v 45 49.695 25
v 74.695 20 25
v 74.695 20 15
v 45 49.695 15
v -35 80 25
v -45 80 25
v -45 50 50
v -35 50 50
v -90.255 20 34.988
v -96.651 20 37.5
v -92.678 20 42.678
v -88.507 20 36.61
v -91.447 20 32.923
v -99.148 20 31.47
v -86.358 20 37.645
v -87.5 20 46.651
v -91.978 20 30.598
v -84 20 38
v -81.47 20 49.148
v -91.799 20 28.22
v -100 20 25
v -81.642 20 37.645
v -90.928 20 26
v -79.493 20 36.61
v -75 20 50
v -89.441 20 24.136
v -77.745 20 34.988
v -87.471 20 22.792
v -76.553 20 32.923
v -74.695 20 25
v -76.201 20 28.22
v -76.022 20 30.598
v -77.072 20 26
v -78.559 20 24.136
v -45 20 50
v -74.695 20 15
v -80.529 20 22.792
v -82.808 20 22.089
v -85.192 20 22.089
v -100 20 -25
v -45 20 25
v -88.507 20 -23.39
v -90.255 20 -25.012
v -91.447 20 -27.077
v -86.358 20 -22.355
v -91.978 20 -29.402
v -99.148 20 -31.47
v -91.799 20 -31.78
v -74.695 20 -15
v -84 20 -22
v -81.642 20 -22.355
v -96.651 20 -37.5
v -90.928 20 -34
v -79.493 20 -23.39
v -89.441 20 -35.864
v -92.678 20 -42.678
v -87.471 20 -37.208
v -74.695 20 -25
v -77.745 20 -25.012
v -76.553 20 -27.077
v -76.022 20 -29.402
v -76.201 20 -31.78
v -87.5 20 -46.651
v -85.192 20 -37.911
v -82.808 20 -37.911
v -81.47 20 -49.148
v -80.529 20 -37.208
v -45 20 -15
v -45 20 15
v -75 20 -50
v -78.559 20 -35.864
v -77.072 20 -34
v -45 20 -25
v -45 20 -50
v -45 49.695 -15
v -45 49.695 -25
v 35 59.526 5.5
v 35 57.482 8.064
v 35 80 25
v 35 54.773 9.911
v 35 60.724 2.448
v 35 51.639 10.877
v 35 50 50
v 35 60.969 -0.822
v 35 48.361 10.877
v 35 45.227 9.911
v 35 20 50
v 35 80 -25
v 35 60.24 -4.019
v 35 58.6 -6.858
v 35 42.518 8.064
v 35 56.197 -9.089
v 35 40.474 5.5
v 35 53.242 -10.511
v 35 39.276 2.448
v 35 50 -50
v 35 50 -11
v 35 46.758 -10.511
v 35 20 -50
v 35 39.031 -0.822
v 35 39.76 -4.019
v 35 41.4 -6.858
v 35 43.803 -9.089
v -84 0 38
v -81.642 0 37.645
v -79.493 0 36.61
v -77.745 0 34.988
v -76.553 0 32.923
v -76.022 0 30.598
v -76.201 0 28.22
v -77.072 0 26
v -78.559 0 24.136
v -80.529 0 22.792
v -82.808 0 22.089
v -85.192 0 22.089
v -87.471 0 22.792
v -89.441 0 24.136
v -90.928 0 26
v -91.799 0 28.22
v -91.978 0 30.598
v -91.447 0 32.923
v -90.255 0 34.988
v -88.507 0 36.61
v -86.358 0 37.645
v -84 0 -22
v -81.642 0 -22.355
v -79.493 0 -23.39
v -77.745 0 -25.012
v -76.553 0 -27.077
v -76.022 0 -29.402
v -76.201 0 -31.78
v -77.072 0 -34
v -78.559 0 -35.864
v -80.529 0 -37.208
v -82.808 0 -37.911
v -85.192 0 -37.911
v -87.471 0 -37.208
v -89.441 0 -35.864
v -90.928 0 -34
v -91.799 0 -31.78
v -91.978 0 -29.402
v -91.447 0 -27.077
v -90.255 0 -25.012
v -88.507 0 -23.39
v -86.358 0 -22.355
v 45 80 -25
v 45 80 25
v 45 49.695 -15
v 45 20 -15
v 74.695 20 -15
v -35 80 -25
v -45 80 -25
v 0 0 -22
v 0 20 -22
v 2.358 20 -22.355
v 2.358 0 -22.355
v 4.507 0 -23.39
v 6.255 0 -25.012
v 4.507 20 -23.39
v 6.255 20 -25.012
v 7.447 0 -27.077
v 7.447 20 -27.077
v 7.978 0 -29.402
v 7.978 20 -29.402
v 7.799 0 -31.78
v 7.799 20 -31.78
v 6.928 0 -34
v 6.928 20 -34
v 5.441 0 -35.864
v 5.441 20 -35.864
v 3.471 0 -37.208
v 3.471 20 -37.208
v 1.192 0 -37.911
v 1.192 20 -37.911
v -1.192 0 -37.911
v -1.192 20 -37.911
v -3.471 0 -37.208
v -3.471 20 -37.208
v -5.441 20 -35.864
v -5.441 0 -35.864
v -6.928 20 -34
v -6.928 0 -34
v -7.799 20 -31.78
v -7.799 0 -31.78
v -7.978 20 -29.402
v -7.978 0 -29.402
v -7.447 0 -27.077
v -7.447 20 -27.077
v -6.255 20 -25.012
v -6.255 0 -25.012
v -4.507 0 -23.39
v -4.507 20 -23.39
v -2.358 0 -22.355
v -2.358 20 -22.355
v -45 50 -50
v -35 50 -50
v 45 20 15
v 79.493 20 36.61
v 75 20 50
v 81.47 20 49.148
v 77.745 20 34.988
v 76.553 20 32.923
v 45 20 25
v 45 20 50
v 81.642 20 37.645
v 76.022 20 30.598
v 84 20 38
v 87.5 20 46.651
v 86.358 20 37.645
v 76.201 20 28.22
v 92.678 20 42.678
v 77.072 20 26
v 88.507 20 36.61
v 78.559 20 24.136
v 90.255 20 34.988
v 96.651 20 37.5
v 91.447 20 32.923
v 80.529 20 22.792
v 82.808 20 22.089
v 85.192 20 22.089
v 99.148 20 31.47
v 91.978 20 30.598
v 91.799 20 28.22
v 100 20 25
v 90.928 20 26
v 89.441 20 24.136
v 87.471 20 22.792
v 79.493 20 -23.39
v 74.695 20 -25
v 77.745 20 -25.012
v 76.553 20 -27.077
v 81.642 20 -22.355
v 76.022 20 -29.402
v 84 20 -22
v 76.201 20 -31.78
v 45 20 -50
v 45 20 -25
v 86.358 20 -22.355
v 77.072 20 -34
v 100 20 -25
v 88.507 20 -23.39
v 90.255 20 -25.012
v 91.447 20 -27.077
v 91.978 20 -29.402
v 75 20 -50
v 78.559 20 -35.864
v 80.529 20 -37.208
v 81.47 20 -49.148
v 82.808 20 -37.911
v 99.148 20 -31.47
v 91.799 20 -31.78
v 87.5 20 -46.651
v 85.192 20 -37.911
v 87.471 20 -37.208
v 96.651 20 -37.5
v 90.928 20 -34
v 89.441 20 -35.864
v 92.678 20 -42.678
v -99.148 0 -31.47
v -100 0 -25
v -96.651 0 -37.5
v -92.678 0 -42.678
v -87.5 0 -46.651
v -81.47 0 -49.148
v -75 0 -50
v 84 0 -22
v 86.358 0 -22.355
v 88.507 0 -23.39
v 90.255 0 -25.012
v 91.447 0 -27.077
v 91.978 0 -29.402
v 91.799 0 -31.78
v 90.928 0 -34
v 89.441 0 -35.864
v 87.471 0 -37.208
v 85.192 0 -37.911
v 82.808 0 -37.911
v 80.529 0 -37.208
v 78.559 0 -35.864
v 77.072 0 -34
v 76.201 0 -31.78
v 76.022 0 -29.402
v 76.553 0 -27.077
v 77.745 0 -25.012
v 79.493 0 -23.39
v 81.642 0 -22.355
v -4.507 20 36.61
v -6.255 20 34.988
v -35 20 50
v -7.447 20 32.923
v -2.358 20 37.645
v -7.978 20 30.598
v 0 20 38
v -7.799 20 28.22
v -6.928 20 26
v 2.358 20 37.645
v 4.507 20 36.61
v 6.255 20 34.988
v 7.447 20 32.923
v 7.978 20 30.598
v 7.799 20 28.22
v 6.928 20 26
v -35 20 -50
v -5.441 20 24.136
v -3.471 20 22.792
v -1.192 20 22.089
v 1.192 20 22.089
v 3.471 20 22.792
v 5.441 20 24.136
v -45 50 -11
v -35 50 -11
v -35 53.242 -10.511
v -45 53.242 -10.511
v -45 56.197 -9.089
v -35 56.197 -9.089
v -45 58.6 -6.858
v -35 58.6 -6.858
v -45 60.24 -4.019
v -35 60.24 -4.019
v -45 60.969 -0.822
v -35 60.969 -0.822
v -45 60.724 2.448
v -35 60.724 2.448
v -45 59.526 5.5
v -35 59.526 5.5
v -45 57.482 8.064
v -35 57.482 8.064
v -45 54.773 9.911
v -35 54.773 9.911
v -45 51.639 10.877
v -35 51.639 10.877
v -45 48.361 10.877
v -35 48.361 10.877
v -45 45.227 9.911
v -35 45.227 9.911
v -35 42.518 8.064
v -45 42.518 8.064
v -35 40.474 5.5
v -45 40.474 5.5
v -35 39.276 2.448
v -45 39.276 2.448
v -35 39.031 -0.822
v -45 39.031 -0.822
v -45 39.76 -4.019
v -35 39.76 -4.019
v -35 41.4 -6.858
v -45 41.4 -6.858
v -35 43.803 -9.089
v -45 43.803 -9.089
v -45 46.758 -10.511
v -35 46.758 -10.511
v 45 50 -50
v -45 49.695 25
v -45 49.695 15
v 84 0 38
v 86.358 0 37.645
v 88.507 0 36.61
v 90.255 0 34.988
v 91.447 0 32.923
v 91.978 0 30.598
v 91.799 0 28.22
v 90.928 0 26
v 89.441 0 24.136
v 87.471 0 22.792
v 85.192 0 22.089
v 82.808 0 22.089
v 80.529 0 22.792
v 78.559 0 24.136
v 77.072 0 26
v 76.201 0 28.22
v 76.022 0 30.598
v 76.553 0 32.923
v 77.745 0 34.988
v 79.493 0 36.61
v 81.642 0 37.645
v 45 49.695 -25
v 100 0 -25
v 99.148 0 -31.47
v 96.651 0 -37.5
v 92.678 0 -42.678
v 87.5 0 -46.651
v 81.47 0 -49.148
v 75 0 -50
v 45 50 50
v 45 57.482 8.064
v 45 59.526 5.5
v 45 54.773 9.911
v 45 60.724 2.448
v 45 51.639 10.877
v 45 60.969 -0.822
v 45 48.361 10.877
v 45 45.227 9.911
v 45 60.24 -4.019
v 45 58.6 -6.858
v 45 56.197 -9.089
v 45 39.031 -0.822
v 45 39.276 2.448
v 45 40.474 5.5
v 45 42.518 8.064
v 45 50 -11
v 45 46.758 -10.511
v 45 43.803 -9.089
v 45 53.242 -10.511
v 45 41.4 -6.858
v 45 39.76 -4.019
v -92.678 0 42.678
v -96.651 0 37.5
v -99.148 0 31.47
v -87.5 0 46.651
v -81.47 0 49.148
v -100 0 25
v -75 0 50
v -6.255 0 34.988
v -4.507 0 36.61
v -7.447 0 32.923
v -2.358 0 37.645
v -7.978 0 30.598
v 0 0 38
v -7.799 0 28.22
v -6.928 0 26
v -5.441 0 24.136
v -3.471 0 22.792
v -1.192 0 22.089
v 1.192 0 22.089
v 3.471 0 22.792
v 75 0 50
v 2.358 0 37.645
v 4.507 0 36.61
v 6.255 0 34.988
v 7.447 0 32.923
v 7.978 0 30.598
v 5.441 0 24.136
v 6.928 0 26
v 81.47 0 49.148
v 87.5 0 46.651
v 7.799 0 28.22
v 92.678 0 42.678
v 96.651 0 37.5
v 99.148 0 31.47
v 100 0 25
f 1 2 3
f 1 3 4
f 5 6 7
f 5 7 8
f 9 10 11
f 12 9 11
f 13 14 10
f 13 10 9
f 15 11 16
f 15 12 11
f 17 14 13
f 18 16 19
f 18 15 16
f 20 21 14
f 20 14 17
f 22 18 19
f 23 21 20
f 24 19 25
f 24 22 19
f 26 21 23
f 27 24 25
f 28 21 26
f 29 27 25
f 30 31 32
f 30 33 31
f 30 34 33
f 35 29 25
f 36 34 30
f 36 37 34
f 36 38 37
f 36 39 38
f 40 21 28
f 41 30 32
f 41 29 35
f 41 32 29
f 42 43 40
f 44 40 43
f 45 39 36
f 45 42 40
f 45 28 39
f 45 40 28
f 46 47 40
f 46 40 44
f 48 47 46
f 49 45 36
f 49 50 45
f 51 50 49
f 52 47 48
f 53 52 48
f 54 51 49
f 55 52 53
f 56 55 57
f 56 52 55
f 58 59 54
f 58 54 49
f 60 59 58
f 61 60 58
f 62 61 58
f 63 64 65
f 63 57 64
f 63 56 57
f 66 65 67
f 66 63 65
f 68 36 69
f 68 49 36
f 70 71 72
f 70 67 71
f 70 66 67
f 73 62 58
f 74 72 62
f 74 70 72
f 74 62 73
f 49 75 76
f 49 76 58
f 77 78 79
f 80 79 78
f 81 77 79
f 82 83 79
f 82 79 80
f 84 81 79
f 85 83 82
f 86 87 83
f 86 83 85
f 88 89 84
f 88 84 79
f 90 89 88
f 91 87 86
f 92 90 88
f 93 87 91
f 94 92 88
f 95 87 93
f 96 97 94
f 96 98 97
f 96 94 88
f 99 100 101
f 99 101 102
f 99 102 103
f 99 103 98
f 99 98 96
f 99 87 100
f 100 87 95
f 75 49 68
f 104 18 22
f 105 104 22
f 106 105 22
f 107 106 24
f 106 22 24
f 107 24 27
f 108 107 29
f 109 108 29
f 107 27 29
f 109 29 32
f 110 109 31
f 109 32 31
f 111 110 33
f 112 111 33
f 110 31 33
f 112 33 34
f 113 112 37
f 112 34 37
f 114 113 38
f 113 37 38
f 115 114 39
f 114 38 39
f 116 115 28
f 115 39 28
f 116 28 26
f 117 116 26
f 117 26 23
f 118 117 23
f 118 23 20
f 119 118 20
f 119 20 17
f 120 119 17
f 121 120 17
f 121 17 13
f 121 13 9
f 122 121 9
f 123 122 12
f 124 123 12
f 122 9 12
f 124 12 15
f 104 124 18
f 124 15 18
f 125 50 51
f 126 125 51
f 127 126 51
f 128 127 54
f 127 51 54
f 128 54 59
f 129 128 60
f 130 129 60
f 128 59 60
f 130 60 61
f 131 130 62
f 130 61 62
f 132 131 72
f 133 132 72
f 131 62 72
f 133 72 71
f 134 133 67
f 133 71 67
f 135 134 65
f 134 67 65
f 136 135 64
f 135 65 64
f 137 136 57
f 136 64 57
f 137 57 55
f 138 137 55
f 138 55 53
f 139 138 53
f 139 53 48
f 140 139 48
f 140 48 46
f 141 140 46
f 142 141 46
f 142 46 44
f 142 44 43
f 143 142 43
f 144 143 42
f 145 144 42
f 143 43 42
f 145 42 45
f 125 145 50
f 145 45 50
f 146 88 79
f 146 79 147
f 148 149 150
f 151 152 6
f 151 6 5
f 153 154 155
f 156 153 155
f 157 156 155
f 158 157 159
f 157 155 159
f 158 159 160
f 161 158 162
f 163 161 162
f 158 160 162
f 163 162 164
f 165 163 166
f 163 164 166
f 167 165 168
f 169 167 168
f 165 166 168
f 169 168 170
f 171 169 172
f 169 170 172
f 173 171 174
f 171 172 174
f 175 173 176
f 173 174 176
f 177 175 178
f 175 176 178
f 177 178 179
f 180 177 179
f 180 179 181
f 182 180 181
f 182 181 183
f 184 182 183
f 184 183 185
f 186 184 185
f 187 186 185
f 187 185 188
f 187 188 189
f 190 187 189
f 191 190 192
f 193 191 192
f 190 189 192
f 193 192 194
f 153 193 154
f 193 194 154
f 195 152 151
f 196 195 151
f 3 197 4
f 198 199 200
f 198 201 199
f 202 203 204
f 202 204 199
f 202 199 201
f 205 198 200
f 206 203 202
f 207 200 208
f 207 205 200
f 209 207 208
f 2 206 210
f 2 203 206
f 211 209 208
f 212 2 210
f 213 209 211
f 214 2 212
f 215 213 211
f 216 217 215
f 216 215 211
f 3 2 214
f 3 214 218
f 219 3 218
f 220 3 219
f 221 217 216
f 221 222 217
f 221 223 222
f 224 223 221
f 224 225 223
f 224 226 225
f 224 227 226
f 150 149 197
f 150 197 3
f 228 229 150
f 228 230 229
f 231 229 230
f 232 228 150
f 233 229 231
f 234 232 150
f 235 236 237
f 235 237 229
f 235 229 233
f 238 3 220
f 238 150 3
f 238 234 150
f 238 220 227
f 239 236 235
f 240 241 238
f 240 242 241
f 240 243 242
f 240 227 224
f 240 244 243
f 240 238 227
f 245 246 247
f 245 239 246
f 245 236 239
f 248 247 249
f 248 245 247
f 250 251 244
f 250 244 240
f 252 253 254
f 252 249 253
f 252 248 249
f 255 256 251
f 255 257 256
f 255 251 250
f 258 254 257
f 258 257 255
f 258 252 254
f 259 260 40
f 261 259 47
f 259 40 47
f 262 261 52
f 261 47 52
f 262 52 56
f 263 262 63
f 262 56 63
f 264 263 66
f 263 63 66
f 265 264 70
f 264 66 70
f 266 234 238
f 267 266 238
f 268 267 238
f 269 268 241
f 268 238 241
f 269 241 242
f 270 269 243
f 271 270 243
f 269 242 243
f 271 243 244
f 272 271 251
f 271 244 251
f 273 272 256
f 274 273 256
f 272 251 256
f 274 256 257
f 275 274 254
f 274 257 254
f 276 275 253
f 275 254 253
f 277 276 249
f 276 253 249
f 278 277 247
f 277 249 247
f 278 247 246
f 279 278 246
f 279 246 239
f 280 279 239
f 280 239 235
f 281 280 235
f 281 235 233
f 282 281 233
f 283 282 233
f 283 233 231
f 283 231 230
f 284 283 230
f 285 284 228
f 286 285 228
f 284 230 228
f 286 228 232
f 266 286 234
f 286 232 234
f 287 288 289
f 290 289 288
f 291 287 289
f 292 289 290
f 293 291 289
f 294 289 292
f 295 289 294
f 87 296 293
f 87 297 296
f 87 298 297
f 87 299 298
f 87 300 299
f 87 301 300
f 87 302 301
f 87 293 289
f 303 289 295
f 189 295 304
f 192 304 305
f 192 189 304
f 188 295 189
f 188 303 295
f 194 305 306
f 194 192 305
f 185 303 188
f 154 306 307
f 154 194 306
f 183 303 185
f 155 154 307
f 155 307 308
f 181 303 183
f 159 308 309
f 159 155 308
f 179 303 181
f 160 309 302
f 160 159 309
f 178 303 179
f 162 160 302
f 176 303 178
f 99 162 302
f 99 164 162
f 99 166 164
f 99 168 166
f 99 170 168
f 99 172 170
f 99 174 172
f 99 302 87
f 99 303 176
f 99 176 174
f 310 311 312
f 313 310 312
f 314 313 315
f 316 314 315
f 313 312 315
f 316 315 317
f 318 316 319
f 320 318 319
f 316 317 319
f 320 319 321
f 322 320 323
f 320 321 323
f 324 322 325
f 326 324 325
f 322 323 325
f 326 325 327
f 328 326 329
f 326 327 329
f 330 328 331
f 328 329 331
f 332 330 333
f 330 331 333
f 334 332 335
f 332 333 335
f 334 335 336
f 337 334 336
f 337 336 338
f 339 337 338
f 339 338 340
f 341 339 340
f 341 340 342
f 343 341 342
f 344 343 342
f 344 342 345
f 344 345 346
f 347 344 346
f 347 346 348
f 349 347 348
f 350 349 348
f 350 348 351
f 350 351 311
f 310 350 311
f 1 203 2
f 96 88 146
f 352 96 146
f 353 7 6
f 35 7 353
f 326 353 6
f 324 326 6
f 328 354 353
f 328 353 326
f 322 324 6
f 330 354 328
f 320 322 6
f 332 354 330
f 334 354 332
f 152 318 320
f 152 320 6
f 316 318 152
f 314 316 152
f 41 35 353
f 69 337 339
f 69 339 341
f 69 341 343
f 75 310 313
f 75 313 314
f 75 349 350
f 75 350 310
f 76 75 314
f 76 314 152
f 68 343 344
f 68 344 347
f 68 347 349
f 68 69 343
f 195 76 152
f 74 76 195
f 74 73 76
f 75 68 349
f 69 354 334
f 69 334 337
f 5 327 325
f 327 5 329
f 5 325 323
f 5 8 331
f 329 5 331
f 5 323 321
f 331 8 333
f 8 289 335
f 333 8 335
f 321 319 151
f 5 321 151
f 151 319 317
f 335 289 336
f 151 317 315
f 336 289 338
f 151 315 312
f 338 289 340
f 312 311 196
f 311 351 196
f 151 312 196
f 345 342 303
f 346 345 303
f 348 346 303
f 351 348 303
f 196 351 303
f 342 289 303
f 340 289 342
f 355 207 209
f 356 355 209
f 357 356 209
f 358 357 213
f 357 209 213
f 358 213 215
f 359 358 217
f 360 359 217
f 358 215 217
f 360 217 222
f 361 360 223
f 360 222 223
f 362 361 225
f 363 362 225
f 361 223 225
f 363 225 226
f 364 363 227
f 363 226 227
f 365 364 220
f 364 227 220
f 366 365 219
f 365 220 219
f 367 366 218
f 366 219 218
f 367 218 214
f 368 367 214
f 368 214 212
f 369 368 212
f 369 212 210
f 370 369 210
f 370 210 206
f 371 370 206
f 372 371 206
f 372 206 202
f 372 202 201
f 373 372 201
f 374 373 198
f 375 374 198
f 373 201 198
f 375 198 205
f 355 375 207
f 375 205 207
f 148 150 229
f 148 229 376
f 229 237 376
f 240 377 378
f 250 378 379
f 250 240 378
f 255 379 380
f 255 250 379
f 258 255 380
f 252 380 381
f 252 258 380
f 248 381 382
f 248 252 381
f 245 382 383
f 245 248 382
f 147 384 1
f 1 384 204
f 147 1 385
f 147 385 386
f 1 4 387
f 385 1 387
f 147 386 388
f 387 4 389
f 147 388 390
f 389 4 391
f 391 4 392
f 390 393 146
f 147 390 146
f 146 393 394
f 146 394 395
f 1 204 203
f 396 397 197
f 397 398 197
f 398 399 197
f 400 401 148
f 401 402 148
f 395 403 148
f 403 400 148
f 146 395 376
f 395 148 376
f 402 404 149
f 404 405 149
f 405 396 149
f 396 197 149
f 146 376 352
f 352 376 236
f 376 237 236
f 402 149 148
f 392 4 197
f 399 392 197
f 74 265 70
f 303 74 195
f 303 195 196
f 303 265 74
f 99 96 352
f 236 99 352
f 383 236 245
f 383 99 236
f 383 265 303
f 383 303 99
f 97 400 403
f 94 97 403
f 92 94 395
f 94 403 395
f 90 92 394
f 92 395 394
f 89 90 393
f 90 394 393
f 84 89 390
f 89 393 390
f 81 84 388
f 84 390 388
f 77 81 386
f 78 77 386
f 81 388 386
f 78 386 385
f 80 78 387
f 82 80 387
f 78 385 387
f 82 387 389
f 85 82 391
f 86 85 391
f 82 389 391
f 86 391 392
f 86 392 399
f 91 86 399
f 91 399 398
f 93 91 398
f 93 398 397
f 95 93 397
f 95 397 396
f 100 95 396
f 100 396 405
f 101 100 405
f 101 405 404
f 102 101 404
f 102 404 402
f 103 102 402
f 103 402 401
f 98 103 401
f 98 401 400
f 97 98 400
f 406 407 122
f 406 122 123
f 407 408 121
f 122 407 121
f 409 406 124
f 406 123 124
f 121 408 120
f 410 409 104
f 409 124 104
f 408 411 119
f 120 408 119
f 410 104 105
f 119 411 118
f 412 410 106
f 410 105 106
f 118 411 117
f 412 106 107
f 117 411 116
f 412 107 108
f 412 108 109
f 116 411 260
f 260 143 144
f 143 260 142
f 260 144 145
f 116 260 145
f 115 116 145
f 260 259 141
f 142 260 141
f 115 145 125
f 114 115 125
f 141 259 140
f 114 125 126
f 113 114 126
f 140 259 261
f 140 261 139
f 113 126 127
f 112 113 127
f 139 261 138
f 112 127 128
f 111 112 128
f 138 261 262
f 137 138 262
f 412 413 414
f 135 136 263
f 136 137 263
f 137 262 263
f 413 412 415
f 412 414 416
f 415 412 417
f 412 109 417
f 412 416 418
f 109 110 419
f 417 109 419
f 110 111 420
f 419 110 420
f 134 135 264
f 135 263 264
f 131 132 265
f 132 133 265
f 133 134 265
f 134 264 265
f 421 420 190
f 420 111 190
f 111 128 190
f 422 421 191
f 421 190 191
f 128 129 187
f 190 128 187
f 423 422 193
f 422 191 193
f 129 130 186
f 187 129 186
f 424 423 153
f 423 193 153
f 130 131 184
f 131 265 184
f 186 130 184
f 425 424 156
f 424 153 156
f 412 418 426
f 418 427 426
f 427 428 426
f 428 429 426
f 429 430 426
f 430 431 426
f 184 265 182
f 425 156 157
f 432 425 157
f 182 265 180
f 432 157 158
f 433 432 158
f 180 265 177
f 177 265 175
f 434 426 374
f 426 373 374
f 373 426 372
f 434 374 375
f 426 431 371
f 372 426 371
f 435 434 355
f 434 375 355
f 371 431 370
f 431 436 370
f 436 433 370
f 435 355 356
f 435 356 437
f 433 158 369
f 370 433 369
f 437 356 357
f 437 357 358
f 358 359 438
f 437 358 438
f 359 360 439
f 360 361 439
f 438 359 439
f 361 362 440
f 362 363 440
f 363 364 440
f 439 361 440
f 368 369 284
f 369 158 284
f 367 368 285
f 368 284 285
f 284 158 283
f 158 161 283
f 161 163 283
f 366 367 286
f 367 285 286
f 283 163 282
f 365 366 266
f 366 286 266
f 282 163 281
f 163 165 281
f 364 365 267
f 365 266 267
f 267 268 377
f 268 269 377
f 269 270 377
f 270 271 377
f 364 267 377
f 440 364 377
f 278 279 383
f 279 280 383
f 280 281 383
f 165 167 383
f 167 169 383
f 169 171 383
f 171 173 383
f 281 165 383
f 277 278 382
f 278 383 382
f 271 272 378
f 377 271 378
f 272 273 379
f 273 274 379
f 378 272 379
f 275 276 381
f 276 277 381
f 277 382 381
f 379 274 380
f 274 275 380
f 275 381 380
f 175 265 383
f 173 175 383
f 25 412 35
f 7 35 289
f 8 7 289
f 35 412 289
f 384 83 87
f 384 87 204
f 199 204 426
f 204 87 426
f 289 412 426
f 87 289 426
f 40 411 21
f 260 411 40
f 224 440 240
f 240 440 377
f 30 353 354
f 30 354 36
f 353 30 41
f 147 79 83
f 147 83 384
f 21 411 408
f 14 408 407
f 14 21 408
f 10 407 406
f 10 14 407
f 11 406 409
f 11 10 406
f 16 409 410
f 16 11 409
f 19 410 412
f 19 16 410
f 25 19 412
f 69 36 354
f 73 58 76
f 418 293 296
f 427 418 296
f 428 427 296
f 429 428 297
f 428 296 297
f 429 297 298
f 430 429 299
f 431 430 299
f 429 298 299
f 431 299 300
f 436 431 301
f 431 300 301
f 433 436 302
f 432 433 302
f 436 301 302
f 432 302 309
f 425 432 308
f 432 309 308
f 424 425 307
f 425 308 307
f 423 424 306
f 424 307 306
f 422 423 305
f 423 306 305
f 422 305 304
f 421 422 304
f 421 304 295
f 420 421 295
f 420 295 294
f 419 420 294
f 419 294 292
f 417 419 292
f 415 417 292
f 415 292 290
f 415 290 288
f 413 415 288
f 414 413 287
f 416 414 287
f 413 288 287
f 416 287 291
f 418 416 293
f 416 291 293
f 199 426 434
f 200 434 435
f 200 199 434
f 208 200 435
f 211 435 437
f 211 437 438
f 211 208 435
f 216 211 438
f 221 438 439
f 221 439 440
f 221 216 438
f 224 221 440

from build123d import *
from OCP.BRepFilletAPI import BRepFilletAPI_MakeChamfer

# Parameters (mm, degrees)
SKETCH2_W           = 200
SKETCH2_H           = 100
BOSS_EXTRUDE1_DEPTH = 20
FILLET1_R           = 25
SKETCH3_R           = 8
CUT_EXTRUDE2_DEPTH  = 20
SKETCH4_W           = 10
SKETCH4_H           = 100
BOSS_EXTRUDE3_DEPTH = 80
CHAMFER1_SIZE       = 30
CHAMFER1_SIZE2      = 25
SKETCH5_R           = 11
CUT_EXTRUDE3_DEPTH  = 127
SKETCH8_W           = 30.69541184
SKETCH8_H           = 10
BOSS_EXTRUDE4_DEPTH = 30
CHAMFER2_SIZE       = 31


with BuildPart() as part:
    # Sketch2 → Boss-Extrude1 (new body)
    with BuildSketch(Plane(origin=(0, 0, 0), x_dir=(1, 0, 0), z_dir=(0, 1, 0))):
        Rectangle(SKETCH2_W, SKETCH2_H)
    extrude(amount=BOSS_EXTRUDE1_DEPTH)

    # Fillet1
    fillet1_edges = [part.edges().sort_by_distance(p)[0] for p in [
        (100, 10, 50),
        (-100, 10, 50),
        (-100, 10, -50),
        (100, 10, -50),
    ]]
    fillet(fillet1_edges, radius=FILLET1_R)

    # Sketch3 → Cut-Extrude2 (cut)
    with BuildSketch(Plane(origin=(0, 20, 0), x_dir=(1, 0, 0), z_dir=(0, 1, 0))):
        with Locations(Location((-84, -30, 0), (0, 0, 270))):
            Circle(SKETCH3_R)
        with Locations(Location((84, -30, 0), (0, 0, 270))):
            Circle(SKETCH3_R)
        with Locations(Location((84, 30, 0), (0, 0, 270))):
            Circle(SKETCH3_R)
        with Locations(Location((-84, 30, 0), (0, 0, 270))):
            Circle(SKETCH3_R)
        with Locations(Location((0, -30, 0), (0, 0, 270))):
            Circle(SKETCH3_R)
        with Locations(Location((0, 30, 0), (0, 0, 270))):
            Circle(SKETCH3_R)
    extrude(amount=-CUT_EXTRUDE2_DEPTH, mode=Mode.SUBTRACT)

    # Sketch4 → Boss-Extrude3 (add)
    with BuildSketch(Plane(origin=(0, 0, 0), x_dir=(1, 0, 0), z_dir=(0, 1, 0))):
        with Locations((-40, 0)):
            Rectangle(SKETCH4_W, SKETCH4_H)
        with Locations((40, 0)):
            Rectangle(SKETCH4_W, SKETCH4_H)
    extrude(amount=BOSS_EXTRUDE3_DEPTH)

    # Chamfer1: one chamfer whose edges measure the first distance from different faces: ONE call of the kernel's chamfer builder (chamfer() names one face for all edges)
    chamfer1_edges_1 = [part.edges().sort_by_distance(p)[0] for p in [
        (40, 80, -50),
        (-40, 80, -50),
    ]]
    chamfer1_side_1 = [part.faces().sort_by_distance(p)[0] for p in [
        (-73.3, 10, -50),
    ]]
    chamfer1_edges_2 = [part.edges().sort_by_distance(p)[0] for p in [
        (40, 80, 50),
        (-40, 80, 50),
    ]]
    chamfer1_side_2 = [part.faces().sort_by_distance(p)[0] for p in [
        (0, 1.7, 50),
    ]]
    chamfer1 = BRepFilletAPI_MakeChamfer(part.part.solid().wrapped)
    for e in chamfer1_edges_1:
        chamfer1.Add(CHAMFER1_SIZE, CHAMFER1_SIZE2, e.wrapped, chamfer1_side_1[0].wrapped)  # the first distance lies on this face
    for e in chamfer1_edges_2:
        chamfer1.Add(CHAMFER1_SIZE, CHAMFER1_SIZE2, e.wrapped, chamfer1_side_2[0].wrapped)  # the first distance lies on this face
    add(Compound.cast(chamfer1.Shape()), mode=Mode.REPLACE)

    # Sketch5 → Cut-Extrude3 (cut)
    with BuildSketch(Plane(origin=(45, 0, 0), x_dir=(0, 0, -1), z_dir=(1, 0, 0))):
        with Locations((0, 50)):
            Circle(SKETCH5_R)
    extrude(amount=-CUT_EXTRUDE3_DEPTH, mode=Mode.SUBTRACT)

    # Sketch8 → Boss-Extrude4 (add)
    with BuildSketch(Plane(origin=(0, 20, 0), x_dir=(1, 0, 0), z_dir=(0, 1, 0))):
        with Locations((60.34770592, -20)):
            Rectangle(SKETCH8_W, SKETCH8_H)
        with Locations((60.34770592, 20)):
            Rectangle(SKETCH8_W, SKETCH8_H)
        with Locations((-60.34770592, -20)):
            Rectangle(SKETCH8_W, SKETCH8_H)
        with Locations((-60.34770592, 20)):
            Rectangle(SKETCH8_W, SKETCH8_H)
    extrude(amount=BOSS_EXTRUDE4_DEPTH)

    # Chamfer2
    # the kernel refuses this chamfer: 31 mm, written as the material it takes off along each edge
    with BuildSketch(Plane(origin=(-75.69541184, 50, 64.722172627), x_dir=(0.9996219169112968, 0.027495876610586407, 0), z_dir=(0, 0, -1))) as chamfer2_piece_1_section:
        Polygon((CHAMFER2_SIZE * 0.999621916911, CHAMFER2_SIZE * 0.0274958766106), (-CHAMFER2_SIZE * 0.0274958766106, CHAMFER2_SIZE * 0.999621916911), (0, 0), align=None)
    chamfer2_piece_1 = extrude(amount=169.444345254, mode=Mode.PRIVATE)
    chamfer2_piece_1 = split(chamfer2_piece_1, bisect_by=Plane(origin=(-45, 39.85641553, -20), z_dir=(-1, 0, 0)), keep=Keep.TOP, mode=Mode.PRIVATE)
    chamfer2_piece_1 = split(chamfer2_piece_1, bisect_by=Plane(origin=(-65.469394976, 20, -20), z_dir=(0, 1, 0)), keep=Keep.TOP, mode=Mode.PRIVATE)
    add(chamfer2_piece_1, mode=Mode.SUBTRACT)
    with BuildSketch(Plane(origin=(-75.69541184, 50, -64.722172627), x_dir=(0.9996219169112968, 0.027495876610586407, 0), z_dir=(0, 0, 1))) as chamfer2_piece_2_section:
        Polygon((CHAMFER2_SIZE * 0.999621916911, -CHAMFER2_SIZE * 0.0274958766106), (-CHAMFER2_SIZE * 0.0274958766106, -CHAMFER2_SIZE * 0.999621916911), (0, 0), align=None)
    chamfer2_piece_2 = extrude(amount=169.444345254, mode=Mode.PRIVATE)
    chamfer2_piece_2 = split(chamfer2_piece_2, bisect_by=Plane(origin=(-45, 39.85641553, 20), z_dir=(-1, 0, 0)), keep=Keep.TOP, mode=Mode.PRIVATE)
    chamfer2_piece_2 = split(chamfer2_piece_2, bisect_by=Plane(origin=(-65.469394976, 20, 20), z_dir=(0, 1, 0)), keep=Keep.TOP, mode=Mode.PRIVATE)
    add(chamfer2_piece_2, mode=Mode.SUBTRACT)
    with BuildSketch(Plane(origin=(75.69541184, 50, 64.722172627), x_dir=(0.02749587661058618, -0.9996219169112968, 0), z_dir=(0, 0, -1))) as chamfer2_piece_3_section:
        Polygon((CHAMFER2_SIZE * 0.999621916911, CHAMFER2_SIZE * 0.0274958766106), (-CHAMFER2_SIZE * 0.0274958766106, CHAMFER2_SIZE * 0.999621916911), (0, 0), align=None)
    chamfer2_piece_3 = extrude(amount=169.444345254, mode=Mode.PRIVATE)
    chamfer2_piece_3 = split(chamfer2_piece_3, bisect_by=Plane(origin=(65.469394976, 20, -20), z_dir=(0, 1, 0)), keep=Keep.TOP, mode=Mode.PRIVATE)
    chamfer2_piece_3 = split(chamfer2_piece_3, bisect_by=Plane(origin=(45, 39.85641553, -20), z_dir=(1, 0, 0)), keep=Keep.TOP, mode=Mode.PRIVATE)
    add(chamfer2_piece_3, mode=Mode.SUBTRACT)
    with BuildSketch(Plane(origin=(75.69541184, 50, 104.722172627), x_dir=(0.02749587661058618, -0.9996219169112968, 0), z_dir=(0, 0, -1))) as chamfer2_piece_4_section:
        Polygon((CHAMFER2_SIZE * 0.999621916911, CHAMFER2_SIZE * 0.0274958766106), (-CHAMFER2_SIZE * 0.0274958766106, CHAMFER2_SIZE * 0.999621916911), (0, 0), align=None)
    chamfer2_piece_4 = extrude(amount=169.444345254, mode=Mode.PRIVATE)
    chamfer2_piece_4 = split(chamfer2_piece_4, bisect_by=Plane(origin=(65.469394976, 20, 20), z_dir=(0, 1, 0)), keep=Keep.TOP, mode=Mode.PRIVATE)
    chamfer2_piece_4 = split(chamfer2_piece_4, bisect_by=Plane(origin=(45, 39.85641553, 20), z_dir=(1, 0, 0)), keep=Keep.TOP, mode=Mode.PRIVATE)
    add(chamfer2_piece_4, mode=Mode.SUBTRACT)


solid = part.part
